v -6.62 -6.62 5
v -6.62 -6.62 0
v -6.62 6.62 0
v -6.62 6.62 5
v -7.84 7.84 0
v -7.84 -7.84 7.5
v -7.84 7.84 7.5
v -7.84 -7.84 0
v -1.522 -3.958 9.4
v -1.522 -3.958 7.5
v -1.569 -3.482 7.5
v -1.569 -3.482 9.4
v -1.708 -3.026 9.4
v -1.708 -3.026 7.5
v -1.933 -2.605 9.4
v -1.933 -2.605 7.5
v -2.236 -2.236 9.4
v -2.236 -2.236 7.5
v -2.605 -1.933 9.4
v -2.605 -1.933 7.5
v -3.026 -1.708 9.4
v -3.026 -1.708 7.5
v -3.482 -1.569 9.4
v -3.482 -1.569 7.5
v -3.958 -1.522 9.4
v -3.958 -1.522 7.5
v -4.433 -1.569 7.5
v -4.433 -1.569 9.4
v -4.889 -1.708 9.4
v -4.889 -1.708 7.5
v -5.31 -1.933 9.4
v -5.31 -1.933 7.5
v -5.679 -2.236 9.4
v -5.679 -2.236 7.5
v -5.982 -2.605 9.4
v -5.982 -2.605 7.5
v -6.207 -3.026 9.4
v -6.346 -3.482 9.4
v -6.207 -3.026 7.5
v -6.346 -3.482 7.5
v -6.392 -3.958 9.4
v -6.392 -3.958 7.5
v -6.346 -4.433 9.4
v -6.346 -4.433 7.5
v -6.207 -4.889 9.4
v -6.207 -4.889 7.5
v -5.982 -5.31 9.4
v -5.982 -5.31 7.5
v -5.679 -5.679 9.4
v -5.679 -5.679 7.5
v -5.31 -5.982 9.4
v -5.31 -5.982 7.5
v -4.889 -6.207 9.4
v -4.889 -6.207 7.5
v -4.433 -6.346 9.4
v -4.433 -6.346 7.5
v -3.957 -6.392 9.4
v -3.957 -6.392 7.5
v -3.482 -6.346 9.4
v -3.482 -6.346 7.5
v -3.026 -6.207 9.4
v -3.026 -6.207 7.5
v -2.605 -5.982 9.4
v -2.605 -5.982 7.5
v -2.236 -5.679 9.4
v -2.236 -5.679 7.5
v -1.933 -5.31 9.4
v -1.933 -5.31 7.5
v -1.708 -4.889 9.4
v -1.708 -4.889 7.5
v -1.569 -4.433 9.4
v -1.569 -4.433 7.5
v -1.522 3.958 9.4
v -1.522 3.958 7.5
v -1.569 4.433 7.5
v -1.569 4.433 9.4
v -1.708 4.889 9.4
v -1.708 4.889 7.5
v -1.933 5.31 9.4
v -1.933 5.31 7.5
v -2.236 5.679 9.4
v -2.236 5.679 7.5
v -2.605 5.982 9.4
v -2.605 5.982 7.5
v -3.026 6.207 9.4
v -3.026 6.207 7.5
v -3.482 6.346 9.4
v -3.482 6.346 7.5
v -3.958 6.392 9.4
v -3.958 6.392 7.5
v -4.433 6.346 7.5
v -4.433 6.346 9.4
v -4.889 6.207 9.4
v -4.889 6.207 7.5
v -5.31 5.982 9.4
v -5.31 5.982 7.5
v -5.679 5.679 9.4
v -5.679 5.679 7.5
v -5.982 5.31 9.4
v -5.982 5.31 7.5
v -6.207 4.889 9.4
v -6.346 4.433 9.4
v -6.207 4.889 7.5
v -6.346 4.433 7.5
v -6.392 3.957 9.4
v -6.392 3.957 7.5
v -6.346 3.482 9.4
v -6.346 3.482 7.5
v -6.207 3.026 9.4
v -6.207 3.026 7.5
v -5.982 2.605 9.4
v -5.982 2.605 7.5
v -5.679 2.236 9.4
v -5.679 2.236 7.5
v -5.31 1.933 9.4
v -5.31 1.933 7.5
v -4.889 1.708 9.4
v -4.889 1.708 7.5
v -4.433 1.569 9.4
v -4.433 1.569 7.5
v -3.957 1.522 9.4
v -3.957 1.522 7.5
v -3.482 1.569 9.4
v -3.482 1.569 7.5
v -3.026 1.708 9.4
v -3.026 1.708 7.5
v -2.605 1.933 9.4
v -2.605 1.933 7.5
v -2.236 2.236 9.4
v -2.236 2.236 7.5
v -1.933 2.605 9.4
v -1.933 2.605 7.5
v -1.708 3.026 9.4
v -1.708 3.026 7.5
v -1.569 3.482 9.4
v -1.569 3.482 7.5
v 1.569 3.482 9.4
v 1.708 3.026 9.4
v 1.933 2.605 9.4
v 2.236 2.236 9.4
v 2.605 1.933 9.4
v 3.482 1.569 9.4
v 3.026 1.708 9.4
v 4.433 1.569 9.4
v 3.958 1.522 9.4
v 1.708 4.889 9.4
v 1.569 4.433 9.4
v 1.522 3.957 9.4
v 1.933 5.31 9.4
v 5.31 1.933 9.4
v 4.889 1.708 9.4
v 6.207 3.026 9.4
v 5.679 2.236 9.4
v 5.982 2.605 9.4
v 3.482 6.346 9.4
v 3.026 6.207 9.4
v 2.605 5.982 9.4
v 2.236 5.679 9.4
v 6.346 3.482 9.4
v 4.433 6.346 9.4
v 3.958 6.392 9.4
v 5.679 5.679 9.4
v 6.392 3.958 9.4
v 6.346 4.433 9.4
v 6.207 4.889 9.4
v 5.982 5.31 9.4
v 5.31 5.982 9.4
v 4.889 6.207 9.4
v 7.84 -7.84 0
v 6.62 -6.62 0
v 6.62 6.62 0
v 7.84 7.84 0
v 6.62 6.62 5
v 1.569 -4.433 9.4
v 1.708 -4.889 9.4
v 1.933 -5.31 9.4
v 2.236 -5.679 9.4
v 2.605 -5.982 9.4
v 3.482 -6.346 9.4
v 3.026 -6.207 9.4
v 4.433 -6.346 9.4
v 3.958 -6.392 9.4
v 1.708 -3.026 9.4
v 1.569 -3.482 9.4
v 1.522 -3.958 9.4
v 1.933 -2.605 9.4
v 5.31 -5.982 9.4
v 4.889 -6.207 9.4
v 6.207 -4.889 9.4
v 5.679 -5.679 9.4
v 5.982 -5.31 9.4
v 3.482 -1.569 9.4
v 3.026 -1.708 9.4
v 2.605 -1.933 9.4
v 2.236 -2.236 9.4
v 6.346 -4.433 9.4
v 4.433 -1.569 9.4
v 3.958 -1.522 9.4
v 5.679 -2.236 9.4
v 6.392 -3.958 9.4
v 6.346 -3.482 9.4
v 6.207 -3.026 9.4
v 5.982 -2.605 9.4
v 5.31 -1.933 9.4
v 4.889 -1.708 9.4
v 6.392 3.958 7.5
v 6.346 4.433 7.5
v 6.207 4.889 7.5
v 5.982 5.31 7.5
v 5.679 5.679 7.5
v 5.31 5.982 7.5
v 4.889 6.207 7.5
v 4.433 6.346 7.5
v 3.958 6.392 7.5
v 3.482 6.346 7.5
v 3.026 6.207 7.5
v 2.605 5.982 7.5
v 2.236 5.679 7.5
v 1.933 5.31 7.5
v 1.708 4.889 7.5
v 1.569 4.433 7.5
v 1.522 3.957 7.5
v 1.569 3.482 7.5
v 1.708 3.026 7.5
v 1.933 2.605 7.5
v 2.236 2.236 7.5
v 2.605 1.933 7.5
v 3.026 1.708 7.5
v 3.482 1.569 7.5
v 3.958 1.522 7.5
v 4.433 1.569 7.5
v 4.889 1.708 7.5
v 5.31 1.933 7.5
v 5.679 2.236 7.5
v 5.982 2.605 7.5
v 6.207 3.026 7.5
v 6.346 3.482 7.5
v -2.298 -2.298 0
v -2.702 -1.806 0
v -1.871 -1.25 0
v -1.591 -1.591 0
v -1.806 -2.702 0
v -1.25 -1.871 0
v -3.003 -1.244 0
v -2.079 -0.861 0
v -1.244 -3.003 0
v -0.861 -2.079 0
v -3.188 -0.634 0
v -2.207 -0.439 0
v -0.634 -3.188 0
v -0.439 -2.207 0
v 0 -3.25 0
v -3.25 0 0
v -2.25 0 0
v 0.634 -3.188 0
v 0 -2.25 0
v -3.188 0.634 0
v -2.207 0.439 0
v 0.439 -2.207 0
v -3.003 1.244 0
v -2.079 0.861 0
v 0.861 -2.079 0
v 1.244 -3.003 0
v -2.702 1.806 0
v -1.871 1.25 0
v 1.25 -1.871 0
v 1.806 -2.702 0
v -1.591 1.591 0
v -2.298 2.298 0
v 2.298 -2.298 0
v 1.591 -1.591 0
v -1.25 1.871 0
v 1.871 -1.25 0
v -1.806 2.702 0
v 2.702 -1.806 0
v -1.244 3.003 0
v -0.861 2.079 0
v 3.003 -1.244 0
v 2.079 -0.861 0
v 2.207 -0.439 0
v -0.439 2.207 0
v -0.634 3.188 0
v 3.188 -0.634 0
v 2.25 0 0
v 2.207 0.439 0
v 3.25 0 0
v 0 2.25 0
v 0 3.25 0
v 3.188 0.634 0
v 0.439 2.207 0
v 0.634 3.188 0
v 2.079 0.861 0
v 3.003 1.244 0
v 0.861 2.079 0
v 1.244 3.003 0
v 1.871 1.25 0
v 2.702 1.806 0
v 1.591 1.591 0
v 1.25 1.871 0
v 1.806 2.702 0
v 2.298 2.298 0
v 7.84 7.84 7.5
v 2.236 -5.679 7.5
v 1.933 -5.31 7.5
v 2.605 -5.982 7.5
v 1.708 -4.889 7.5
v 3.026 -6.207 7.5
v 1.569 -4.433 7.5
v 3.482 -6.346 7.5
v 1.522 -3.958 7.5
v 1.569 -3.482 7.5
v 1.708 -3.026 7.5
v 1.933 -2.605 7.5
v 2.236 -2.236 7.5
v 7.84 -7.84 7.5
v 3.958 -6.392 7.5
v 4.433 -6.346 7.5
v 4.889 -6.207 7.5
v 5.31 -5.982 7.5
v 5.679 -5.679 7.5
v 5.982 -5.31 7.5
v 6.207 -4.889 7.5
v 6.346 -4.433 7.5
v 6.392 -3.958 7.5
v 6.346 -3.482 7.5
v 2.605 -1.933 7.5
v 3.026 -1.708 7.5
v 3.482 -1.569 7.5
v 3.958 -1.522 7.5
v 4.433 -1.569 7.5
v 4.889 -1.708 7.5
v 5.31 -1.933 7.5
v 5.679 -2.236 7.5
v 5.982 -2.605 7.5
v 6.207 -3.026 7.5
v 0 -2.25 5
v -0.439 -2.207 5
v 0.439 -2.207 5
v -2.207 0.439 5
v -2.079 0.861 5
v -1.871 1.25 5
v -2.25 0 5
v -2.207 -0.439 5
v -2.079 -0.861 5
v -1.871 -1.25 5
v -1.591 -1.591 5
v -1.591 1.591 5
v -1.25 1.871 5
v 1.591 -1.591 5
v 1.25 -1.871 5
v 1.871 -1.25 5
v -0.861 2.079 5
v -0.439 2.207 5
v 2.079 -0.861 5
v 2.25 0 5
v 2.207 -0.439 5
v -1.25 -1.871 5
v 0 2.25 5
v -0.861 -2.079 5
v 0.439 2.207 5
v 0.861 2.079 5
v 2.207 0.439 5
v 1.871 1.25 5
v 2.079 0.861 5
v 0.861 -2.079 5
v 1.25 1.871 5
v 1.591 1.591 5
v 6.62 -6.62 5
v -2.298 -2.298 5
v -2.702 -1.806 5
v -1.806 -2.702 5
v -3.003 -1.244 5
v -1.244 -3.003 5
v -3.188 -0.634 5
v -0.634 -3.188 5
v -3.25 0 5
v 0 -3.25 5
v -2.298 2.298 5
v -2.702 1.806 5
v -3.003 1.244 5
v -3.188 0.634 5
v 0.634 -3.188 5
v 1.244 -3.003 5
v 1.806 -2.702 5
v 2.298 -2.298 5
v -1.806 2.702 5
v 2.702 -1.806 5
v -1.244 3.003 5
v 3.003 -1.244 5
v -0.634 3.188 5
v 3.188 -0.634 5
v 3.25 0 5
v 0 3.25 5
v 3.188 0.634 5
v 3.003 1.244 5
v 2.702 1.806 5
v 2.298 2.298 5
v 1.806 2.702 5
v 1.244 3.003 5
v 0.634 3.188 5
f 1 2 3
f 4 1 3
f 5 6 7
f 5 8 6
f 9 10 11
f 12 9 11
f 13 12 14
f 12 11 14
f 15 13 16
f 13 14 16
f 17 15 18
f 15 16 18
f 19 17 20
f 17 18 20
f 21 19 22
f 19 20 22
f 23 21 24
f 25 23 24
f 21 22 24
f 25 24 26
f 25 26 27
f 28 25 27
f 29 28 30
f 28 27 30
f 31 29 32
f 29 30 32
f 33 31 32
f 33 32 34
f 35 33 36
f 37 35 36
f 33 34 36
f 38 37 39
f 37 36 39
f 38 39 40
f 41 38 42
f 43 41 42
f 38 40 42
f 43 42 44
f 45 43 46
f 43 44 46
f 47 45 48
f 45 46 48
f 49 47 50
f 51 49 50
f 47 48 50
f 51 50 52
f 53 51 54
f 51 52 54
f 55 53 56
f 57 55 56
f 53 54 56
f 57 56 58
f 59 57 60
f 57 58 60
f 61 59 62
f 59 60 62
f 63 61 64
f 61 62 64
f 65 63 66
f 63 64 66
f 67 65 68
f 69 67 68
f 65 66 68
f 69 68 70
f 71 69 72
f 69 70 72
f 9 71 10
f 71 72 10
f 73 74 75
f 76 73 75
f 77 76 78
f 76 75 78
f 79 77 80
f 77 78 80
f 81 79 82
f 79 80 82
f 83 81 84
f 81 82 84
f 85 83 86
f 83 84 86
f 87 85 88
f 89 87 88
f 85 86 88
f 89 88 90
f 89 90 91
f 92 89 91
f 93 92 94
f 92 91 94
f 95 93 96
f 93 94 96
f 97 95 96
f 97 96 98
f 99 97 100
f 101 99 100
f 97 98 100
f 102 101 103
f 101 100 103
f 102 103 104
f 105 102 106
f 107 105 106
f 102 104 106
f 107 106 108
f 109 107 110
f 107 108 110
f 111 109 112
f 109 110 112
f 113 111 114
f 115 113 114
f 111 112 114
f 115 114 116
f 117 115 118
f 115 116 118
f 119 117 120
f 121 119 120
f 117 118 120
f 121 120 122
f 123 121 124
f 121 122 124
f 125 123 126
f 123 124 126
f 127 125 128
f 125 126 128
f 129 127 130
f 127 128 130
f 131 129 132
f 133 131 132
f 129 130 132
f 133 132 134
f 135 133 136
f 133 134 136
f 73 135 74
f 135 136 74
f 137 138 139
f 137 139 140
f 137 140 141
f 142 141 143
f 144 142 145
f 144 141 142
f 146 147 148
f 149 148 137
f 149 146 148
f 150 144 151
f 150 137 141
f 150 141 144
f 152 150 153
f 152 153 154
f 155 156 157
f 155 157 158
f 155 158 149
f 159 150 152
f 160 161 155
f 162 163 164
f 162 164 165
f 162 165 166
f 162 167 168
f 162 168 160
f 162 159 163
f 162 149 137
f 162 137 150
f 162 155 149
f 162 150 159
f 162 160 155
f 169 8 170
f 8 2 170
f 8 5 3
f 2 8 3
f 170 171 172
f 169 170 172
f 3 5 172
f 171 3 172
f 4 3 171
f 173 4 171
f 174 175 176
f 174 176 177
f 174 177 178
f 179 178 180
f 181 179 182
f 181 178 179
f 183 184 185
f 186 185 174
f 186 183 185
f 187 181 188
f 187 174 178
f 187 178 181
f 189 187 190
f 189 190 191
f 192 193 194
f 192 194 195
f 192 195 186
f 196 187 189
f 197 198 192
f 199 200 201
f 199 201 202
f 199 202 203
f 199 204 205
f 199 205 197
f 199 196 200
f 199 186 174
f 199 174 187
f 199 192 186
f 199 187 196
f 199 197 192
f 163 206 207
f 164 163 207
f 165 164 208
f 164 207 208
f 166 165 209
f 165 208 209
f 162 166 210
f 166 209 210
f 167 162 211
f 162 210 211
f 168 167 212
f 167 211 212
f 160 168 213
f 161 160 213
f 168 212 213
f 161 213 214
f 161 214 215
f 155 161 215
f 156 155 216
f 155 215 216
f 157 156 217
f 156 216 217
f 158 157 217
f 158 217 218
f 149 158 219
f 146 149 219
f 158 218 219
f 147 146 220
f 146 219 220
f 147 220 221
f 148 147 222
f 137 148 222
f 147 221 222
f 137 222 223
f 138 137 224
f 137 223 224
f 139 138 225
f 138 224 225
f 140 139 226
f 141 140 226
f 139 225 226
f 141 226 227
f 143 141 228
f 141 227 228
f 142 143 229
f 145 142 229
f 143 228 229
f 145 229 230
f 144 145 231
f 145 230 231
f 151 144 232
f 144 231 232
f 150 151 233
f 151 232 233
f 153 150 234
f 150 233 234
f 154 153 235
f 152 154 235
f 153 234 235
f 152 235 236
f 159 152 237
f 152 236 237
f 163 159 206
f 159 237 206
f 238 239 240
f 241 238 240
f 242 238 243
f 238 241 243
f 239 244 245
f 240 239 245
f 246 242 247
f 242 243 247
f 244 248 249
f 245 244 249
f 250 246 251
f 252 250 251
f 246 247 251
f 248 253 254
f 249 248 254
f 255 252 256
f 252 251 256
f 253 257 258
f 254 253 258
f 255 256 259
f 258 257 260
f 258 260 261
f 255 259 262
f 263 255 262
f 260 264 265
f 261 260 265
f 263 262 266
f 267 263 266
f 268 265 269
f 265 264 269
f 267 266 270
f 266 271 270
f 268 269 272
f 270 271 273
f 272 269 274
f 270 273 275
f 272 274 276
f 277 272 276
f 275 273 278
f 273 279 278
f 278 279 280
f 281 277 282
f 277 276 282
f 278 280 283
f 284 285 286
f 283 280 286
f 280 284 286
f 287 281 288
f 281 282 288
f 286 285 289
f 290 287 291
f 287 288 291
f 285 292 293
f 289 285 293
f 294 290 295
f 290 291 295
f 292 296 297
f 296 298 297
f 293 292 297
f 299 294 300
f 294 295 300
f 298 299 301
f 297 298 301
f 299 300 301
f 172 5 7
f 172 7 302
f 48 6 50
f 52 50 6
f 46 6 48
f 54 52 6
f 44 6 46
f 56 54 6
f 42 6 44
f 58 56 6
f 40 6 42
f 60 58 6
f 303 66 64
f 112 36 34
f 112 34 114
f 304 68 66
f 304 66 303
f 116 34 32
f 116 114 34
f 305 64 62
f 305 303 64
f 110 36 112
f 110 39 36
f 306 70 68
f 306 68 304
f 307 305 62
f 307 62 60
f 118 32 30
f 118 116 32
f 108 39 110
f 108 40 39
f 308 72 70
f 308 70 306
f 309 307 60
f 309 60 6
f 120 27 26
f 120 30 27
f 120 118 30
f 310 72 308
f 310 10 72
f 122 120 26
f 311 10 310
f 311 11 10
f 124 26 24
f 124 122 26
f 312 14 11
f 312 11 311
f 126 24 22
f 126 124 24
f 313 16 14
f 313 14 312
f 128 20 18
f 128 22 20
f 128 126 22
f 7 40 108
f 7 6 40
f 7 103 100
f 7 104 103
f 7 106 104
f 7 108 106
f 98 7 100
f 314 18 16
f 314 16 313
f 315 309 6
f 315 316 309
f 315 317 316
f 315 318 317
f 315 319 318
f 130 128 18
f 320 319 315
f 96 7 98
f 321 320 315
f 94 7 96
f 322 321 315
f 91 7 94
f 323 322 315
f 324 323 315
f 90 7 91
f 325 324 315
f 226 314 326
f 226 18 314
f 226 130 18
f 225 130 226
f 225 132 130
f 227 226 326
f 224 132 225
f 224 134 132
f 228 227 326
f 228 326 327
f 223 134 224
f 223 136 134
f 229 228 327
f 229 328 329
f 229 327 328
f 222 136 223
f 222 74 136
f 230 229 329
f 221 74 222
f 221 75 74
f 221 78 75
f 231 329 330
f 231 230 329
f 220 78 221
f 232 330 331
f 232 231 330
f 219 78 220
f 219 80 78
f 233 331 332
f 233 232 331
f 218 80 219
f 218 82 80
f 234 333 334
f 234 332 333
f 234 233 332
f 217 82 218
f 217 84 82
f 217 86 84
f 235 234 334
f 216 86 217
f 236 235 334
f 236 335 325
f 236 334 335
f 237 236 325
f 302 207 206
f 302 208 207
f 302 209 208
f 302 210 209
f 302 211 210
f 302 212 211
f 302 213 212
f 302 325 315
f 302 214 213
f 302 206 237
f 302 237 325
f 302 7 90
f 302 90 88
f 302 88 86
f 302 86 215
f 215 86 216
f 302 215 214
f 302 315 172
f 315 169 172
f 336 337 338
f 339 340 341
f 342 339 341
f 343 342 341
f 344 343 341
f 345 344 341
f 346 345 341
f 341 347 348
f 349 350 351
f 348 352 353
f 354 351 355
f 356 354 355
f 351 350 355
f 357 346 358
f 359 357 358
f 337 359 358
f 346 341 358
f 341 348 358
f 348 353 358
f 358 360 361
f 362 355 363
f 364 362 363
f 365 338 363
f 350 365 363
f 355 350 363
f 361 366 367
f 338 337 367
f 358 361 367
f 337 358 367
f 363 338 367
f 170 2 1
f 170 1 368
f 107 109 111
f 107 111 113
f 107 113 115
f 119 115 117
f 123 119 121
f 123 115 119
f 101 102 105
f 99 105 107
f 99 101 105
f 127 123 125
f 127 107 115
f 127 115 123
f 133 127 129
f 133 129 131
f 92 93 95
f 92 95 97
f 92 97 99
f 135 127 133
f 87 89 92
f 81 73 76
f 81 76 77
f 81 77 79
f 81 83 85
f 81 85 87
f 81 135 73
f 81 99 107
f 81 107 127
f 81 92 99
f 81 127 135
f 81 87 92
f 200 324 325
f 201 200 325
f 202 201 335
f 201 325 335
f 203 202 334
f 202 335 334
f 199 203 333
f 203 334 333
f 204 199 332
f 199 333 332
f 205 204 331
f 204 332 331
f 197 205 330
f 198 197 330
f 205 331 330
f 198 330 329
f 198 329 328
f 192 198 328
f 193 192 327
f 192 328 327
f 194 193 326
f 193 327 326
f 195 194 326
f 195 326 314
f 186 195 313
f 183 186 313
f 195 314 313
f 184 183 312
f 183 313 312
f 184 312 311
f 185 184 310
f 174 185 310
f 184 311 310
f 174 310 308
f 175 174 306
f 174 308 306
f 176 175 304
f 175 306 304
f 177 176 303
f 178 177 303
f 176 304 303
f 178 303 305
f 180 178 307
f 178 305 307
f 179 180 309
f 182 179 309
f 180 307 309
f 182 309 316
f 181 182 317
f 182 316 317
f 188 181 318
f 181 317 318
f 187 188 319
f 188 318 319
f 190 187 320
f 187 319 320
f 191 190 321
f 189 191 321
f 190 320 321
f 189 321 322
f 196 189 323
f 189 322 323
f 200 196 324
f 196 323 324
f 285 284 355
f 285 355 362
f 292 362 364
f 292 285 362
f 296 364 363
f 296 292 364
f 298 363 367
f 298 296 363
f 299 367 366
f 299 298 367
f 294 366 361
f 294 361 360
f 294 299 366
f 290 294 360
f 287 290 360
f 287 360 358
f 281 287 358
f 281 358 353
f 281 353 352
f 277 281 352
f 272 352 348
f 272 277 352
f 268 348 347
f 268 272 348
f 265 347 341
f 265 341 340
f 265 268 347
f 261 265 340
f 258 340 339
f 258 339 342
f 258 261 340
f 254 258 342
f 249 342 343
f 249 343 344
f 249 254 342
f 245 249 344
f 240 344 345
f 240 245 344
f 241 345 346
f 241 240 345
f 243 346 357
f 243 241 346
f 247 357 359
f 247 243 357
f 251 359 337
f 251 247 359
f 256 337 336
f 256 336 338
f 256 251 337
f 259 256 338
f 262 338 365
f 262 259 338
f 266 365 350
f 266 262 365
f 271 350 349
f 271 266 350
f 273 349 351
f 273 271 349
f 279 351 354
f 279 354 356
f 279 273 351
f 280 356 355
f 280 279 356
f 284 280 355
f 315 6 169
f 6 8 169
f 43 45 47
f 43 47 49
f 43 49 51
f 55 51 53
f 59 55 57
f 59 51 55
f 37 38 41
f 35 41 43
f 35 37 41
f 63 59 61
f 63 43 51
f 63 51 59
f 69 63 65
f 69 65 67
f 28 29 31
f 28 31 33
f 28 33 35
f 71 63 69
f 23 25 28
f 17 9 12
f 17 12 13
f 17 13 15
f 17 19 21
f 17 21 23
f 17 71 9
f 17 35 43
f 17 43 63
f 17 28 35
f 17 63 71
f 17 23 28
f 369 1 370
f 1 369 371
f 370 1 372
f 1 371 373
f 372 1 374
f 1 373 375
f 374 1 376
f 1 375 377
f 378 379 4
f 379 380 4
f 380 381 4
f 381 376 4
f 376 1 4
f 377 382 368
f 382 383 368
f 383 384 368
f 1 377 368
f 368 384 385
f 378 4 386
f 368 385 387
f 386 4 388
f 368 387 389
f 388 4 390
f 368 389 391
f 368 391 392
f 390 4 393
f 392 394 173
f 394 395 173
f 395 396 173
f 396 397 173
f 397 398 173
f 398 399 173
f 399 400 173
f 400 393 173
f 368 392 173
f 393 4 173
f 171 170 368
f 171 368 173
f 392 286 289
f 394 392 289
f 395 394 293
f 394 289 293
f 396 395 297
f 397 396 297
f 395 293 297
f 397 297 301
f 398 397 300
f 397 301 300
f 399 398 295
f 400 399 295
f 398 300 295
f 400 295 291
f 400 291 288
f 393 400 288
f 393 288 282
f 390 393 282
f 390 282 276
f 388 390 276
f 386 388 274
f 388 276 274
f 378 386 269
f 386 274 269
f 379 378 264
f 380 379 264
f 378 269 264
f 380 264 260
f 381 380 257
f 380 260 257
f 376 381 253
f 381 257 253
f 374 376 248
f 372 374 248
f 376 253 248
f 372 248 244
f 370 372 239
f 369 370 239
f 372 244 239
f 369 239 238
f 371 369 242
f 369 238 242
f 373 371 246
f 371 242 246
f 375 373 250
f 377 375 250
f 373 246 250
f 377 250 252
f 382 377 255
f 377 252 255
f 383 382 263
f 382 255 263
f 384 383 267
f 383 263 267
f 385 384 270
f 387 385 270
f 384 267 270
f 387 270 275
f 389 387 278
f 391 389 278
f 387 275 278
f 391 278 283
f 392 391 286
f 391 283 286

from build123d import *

# Parameters (mm, degrees)
F2_W     = 15.68
F2_H     = 15.68
F2_W_2   = 13.24
F2_H_2   = 13.24
F3_DEPTH = 5
F2_R     = 3.25
F2_R_2   = 2.25
F5_W     = 15.68
F5_H     = 15.68
F6_DEPTH = 2.5
F7_R     = 2.435
F8_DEPTH = 1.9


with BuildPart() as f3:
    # F2 (on Top) → F3 (new body)
    with BuildSketch(Plane.XY):
        Rectangle(F2_W, F2_H)
        Rectangle(F2_W_2, F2_H_2, mode=Mode.SUBTRACT)
    extrude(amount=F3_DEPTH)



with BuildPart() as f3b:
    # F2 (on Top) → F3, piece 2 (new body)
    with BuildSketch(Plane.XY):
        Circle(F2_R)
        Circle(F2_R_2, mode=Mode.SUBTRACT)
    extrude(amount=F3_DEPTH)


with BuildPart() as f3_1:
    add(f3.part)

    add(f3b.part)  # F6 merges F3b
    # F5 (on offset) → F6 (join)
    with BuildSketch(Plane.XY.offset(5)):
        Rectangle(F5_W, F5_H)
    extrude(amount=F6_DEPTH)

    # F7 (on face) → F8 (join)
    with BuildSketch(Plane.XY.offset(7.5)):
        with Locations((-3.9575, 3.9575)):
            Circle(F7_R)
        with Locations((-3.9575, -3.9575)):
            Circle(F7_R)
        with Locations((3.9575, -3.9575)):
            Circle(F7_R)
        with Locations((3.9575, 3.9575)):
            Circle(F7_R)
    extrude(amount=F8_DEPTH)


solid = f3_1.part
